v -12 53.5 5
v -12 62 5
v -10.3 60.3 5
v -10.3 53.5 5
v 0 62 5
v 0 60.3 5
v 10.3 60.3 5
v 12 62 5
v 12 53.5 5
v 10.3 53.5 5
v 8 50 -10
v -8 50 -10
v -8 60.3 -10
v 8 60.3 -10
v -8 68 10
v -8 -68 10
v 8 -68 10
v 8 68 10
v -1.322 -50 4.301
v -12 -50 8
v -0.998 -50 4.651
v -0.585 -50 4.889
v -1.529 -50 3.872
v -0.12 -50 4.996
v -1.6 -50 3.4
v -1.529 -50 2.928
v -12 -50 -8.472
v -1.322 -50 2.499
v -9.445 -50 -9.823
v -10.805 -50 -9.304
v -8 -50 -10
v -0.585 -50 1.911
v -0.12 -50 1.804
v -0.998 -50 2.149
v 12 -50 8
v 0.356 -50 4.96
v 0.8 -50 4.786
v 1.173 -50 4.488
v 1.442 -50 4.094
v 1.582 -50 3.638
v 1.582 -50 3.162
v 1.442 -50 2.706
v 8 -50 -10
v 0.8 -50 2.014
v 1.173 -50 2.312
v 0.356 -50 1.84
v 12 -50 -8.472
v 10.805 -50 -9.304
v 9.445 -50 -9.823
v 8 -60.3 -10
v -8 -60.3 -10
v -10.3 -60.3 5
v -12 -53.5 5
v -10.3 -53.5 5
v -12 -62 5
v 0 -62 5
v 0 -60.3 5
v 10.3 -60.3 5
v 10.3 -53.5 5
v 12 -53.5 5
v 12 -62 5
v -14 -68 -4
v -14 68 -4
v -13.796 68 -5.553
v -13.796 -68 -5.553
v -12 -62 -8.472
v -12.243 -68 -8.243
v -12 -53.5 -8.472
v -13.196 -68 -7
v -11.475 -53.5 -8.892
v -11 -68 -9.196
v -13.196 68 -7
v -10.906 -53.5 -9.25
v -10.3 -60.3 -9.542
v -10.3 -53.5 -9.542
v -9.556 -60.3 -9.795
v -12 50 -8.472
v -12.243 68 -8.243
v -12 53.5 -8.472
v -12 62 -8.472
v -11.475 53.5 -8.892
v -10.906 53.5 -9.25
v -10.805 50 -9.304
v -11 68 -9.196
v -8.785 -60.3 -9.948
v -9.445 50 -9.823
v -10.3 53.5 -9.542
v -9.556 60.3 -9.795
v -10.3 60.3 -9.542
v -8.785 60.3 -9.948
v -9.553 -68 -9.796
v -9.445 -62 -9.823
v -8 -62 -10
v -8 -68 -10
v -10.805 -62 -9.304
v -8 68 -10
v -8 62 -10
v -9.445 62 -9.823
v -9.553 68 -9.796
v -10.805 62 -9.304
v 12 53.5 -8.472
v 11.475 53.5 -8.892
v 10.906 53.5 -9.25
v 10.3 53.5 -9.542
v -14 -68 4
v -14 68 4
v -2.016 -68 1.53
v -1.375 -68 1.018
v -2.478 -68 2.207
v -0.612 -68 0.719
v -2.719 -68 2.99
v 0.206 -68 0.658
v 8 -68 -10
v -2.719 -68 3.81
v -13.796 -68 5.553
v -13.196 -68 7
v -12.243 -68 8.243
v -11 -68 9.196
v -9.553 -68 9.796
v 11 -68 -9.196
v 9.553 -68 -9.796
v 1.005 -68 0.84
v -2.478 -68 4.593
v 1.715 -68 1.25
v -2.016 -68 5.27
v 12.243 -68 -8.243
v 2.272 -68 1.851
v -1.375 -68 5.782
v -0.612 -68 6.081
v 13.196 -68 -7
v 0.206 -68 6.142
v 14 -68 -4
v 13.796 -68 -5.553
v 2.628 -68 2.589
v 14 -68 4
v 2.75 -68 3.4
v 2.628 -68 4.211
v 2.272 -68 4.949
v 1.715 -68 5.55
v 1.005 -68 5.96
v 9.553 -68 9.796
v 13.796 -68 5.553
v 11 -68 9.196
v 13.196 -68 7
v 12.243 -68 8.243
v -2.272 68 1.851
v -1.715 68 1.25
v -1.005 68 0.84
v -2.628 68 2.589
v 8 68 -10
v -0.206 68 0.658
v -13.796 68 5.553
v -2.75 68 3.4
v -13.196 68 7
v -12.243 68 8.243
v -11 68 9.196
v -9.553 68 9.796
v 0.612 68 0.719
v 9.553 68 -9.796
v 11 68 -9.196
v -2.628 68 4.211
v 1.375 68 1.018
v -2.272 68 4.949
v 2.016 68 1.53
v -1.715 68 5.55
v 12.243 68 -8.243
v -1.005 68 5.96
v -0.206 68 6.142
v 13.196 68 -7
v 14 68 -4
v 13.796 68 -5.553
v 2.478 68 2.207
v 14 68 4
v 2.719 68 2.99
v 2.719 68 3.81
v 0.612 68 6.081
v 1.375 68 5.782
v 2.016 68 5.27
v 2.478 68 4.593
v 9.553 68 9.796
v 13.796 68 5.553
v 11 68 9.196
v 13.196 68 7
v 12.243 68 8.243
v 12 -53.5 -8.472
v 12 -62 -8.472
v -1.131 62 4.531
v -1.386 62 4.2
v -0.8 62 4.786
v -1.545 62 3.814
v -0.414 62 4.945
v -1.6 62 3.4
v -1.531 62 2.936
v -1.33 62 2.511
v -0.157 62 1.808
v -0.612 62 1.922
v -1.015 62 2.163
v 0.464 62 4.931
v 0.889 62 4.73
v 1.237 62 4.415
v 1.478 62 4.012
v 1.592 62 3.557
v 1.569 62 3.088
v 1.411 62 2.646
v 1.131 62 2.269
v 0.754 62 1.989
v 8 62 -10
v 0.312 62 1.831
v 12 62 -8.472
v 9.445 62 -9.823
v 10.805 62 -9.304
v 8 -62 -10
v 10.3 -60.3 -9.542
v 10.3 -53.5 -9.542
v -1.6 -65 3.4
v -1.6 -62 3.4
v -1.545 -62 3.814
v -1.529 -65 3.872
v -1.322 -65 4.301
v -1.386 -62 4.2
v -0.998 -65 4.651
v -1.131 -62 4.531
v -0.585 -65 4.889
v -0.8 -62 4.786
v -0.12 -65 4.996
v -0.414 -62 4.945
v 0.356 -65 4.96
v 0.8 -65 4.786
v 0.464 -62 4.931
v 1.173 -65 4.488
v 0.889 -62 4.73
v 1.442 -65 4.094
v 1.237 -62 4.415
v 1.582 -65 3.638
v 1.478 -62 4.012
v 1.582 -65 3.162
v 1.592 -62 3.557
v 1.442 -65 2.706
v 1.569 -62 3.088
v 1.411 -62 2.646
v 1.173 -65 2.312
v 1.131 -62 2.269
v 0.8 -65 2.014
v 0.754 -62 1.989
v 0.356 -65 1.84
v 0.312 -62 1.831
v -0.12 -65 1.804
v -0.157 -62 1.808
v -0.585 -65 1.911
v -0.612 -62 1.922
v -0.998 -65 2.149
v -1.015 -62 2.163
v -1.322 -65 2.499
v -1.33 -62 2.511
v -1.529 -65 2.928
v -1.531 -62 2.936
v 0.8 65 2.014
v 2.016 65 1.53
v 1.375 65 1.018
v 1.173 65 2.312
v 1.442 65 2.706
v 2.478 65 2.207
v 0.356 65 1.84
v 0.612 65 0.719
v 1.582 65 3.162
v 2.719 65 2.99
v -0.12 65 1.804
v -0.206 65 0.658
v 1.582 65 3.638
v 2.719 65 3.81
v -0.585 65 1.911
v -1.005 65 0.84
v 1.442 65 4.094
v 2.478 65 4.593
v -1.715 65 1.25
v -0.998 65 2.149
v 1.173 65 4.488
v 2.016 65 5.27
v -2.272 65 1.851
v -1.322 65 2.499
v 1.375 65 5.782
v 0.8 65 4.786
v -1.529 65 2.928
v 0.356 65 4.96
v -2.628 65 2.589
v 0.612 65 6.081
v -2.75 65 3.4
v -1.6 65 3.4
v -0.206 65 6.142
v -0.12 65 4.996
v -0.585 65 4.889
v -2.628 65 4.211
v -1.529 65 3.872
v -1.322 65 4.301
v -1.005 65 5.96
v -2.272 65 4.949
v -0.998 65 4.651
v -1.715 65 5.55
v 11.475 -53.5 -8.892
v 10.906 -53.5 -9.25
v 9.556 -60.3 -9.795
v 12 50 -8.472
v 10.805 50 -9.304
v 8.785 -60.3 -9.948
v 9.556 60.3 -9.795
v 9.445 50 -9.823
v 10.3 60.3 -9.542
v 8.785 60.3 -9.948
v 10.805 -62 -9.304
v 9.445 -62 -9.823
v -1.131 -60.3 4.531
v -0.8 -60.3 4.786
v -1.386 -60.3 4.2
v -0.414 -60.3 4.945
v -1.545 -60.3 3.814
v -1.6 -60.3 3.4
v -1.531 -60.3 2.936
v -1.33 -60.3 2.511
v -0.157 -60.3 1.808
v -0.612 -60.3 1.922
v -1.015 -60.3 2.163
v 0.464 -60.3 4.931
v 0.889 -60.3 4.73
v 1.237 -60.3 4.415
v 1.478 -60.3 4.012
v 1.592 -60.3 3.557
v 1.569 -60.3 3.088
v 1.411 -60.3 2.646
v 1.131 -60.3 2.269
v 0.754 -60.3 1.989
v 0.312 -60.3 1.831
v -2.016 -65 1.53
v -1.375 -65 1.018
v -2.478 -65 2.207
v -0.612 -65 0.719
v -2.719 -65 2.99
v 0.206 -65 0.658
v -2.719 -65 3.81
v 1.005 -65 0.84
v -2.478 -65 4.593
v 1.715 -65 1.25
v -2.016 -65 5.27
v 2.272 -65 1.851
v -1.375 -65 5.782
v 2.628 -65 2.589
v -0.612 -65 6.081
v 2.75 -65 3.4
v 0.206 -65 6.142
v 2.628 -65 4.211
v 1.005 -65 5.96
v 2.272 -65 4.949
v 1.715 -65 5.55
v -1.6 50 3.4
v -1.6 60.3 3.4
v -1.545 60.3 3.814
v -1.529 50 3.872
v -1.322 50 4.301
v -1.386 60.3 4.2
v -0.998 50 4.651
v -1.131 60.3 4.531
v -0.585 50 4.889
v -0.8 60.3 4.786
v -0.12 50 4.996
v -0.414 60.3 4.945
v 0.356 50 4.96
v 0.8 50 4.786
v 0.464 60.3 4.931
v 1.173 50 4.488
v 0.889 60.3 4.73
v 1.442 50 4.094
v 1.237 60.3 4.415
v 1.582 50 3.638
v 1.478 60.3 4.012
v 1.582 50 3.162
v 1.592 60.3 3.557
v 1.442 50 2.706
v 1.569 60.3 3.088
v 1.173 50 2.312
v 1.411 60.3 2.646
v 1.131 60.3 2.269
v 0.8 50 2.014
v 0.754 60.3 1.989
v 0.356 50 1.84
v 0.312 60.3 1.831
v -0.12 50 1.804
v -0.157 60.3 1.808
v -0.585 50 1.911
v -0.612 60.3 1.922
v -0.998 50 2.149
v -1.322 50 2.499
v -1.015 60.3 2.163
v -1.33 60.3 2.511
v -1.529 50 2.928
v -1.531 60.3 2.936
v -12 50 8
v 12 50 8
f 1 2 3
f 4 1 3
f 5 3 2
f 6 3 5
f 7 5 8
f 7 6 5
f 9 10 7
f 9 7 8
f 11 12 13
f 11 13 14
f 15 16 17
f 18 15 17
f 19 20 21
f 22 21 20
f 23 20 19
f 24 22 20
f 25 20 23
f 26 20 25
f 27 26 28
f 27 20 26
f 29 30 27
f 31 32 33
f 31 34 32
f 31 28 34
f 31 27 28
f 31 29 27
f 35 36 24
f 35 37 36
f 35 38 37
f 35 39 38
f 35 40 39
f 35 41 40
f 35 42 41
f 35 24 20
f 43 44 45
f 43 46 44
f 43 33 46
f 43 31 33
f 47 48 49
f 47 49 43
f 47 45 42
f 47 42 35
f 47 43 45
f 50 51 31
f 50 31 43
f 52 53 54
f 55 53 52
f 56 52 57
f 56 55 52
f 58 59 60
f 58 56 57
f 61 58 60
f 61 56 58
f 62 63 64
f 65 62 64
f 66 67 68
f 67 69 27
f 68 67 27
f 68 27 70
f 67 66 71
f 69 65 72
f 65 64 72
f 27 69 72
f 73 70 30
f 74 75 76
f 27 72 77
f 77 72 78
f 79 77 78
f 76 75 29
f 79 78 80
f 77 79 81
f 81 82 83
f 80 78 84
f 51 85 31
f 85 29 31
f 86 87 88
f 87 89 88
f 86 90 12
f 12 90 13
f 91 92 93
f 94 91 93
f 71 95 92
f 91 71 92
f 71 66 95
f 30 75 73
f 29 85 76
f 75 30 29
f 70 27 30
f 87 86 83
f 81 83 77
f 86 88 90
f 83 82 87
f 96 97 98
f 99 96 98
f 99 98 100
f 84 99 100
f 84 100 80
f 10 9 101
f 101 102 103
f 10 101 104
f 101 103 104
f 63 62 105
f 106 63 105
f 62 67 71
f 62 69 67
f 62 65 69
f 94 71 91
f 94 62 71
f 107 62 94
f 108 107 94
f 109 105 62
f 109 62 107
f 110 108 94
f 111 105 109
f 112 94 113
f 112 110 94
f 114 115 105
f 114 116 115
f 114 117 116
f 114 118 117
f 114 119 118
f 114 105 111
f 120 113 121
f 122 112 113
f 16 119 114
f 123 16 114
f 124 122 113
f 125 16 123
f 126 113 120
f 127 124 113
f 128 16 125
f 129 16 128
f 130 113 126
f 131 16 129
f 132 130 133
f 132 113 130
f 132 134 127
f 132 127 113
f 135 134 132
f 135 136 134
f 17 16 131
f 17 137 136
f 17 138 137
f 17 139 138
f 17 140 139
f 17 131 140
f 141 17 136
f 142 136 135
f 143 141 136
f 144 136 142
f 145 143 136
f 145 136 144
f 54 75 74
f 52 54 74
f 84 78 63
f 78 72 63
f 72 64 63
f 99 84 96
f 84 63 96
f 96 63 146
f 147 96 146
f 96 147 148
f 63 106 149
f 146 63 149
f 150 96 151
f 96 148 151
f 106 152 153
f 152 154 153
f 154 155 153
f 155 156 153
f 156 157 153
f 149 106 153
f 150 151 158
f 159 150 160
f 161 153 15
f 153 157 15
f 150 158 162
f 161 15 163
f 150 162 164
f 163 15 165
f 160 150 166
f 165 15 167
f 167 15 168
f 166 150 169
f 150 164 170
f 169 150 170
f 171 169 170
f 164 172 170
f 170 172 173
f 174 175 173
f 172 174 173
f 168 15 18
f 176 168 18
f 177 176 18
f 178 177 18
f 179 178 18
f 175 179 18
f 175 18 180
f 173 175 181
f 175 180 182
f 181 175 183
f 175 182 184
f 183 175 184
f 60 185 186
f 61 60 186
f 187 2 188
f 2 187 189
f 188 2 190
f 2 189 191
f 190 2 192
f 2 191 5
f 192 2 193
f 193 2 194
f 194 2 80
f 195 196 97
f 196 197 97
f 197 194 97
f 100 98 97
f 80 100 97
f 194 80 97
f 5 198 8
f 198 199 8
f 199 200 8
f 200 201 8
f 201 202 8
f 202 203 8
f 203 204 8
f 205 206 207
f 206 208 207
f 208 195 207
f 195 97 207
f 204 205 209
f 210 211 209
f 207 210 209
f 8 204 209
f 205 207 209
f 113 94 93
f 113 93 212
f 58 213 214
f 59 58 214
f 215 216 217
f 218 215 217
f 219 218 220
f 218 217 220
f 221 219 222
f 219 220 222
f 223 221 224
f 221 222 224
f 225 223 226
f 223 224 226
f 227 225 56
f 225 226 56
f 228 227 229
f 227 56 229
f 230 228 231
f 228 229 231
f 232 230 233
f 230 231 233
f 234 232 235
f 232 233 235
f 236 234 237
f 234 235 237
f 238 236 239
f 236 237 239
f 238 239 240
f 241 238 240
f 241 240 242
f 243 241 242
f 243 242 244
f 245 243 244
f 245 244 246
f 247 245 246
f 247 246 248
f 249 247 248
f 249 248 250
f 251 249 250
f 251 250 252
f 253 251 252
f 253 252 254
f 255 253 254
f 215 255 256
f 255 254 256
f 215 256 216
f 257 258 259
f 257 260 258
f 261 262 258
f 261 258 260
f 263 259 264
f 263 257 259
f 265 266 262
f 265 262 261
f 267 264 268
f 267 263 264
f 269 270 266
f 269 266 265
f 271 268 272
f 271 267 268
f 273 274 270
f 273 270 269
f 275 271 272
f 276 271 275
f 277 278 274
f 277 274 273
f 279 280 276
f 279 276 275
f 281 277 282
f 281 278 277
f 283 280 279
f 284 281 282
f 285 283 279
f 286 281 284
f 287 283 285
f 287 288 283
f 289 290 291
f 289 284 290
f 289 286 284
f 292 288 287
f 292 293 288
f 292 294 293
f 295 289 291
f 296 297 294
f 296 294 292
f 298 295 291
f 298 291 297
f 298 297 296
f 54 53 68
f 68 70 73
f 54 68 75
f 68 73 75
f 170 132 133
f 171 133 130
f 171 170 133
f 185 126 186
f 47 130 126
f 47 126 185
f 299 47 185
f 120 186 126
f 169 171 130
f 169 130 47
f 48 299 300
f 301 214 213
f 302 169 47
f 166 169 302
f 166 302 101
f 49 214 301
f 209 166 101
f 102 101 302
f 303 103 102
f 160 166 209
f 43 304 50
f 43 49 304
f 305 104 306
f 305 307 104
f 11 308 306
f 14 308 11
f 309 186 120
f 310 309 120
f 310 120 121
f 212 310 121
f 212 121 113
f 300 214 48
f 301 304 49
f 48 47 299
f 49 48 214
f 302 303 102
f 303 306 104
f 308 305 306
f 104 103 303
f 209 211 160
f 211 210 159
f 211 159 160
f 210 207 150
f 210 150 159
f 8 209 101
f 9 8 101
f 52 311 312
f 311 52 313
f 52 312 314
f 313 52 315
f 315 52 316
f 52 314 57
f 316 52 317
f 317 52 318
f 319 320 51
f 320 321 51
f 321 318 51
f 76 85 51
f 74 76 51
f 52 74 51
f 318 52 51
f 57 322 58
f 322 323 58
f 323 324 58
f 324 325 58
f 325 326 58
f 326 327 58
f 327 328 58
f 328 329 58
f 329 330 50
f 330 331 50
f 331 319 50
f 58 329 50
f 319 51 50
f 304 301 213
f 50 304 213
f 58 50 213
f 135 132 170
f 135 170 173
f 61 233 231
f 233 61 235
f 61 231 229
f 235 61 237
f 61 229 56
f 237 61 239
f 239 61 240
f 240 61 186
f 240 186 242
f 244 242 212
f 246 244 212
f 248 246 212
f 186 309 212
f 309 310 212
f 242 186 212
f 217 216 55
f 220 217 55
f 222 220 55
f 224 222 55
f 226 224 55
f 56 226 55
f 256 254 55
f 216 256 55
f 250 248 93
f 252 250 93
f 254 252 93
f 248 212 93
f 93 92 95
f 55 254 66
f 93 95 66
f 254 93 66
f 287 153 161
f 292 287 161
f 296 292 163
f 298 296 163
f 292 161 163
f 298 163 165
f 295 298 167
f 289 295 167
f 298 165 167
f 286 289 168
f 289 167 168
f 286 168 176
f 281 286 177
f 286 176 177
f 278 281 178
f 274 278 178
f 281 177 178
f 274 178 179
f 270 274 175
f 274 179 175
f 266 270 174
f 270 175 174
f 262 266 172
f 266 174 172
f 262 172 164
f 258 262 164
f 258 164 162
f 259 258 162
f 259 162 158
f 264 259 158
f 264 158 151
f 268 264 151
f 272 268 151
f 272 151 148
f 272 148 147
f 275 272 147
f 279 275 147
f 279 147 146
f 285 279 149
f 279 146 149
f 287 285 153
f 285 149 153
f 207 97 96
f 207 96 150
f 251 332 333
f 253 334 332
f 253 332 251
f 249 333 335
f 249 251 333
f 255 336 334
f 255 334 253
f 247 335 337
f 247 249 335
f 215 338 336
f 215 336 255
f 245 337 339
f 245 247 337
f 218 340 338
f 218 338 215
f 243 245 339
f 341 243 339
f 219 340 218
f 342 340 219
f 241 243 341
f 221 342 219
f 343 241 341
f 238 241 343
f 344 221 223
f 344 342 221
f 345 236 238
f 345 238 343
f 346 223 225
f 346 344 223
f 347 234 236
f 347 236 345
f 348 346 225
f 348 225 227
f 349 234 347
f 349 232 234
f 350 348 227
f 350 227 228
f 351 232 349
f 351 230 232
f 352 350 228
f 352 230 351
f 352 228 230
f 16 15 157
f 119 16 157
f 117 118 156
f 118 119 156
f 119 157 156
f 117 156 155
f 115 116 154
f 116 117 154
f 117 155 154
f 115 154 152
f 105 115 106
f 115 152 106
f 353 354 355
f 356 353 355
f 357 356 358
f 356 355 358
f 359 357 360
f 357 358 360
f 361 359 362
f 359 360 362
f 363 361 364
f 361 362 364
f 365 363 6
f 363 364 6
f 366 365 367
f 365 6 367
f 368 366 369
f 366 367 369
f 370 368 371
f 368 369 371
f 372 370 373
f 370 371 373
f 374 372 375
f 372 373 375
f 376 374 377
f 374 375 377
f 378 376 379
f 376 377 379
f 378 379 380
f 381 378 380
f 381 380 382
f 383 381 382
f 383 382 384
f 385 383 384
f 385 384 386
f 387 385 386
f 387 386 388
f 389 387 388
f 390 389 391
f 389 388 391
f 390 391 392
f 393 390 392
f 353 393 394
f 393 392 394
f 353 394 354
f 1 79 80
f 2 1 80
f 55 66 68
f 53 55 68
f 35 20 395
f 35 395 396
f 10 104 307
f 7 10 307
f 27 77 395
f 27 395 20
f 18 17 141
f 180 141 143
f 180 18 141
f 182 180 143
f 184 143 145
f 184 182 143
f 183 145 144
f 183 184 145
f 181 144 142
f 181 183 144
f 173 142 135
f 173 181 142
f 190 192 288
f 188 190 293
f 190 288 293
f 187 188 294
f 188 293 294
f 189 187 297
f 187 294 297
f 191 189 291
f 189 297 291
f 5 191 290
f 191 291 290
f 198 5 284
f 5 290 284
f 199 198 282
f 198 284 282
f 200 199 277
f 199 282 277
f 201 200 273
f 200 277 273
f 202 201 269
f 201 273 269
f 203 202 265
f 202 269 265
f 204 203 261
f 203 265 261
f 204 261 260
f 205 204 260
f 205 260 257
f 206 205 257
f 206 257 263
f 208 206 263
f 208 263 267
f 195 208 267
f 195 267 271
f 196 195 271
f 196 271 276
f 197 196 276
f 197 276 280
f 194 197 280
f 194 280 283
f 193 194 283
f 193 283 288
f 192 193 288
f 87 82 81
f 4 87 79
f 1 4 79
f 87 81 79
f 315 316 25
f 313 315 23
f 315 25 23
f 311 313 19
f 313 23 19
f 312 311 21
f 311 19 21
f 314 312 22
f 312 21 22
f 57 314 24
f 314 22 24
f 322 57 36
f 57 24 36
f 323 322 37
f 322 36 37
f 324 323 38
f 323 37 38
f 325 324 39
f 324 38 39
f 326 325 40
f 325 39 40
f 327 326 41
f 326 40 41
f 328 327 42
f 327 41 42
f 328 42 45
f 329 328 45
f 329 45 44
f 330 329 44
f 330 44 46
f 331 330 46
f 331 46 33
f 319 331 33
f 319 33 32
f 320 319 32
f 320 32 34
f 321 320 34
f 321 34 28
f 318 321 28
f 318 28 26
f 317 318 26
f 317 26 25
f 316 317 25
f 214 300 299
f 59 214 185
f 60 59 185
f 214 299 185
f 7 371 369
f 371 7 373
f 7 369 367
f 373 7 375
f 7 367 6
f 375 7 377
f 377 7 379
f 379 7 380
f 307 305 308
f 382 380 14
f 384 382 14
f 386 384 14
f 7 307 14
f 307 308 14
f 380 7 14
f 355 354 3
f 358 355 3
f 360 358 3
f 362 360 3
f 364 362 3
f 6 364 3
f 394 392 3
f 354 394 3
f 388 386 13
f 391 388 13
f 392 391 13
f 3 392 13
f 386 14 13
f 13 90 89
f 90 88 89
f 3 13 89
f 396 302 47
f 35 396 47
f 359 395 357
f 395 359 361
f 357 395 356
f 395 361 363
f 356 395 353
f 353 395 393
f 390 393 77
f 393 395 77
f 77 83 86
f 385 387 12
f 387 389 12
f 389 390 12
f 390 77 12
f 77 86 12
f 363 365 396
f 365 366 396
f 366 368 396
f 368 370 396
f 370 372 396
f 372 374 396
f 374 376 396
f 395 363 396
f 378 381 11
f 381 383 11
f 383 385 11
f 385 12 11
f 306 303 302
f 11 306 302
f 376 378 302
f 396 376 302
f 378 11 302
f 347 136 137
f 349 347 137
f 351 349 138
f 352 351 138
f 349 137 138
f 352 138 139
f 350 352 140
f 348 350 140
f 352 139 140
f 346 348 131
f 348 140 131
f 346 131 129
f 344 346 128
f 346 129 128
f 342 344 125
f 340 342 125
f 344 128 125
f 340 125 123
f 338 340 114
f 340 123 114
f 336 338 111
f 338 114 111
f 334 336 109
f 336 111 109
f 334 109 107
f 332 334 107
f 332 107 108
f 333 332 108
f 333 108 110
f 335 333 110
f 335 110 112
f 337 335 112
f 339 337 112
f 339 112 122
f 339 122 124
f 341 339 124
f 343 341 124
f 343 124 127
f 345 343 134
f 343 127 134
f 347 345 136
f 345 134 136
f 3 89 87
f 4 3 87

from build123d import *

# Parameters (mm, degrees)
F0_W        = 28
F0_H        = 20
F1_DEPTH    = 68
F3_DEPTH    = 15
F2_W        = 24
F2_H        = 100
F4_DEPTH    = 18
F5_T1_DEPTH = 166
F6_R        = 1.6
F7_DEPTH    = 140
F6_R_2      = 2.75
F8_DEPTH    = 3
F9_R        = 2.75
F9_R_2      = 1.6
F10_DEPTH   = 3


# Not quite as in the source:
# - a fillet or chamfer that OpenCascade refuses, or shapes differently, is made with other operations: its cross-section is extruded or revolved along the edge and cut away or added


with BuildPart() as f1:
    # F0 (on Front) → F1 (new body, symmetric)
    with BuildSketch(Plane.XZ):
        Rectangle(F0_W, F0_H)
    extrude(amount=F1_DEPTH, both=True)

    # F2 (on face) → F3 (cut)
    with BuildSketch(Plane(origin=(0, 0, -10), x_dir=(1, 0, 0), z_dir=(0, 0, -1))):
        Polygon((12, 62), (-12, 62), (-12, 53.5), (-10.3, 53.5), (-10.3, 60.3), (10.3, 60.3), (10.3, 53.5), (12, 53.5), align=None)
        Polygon((-12, -53.5), (-12, -62), (12, -62), (12, -53.5), (10.3, -53.5), (10.3, -60.3), (-10.3, -60.3), (-10.3, -53.5), align=None)
    extrude(amount=-F3_DEPTH, mode=Mode.SUBTRACT)

    # F2 (on face) → F4 (cut)
    with BuildSketch(Plane(origin=(0, 0, -10), x_dir=(1, 0, 0), z_dir=(0, 0, -1))):
        Rectangle(F2_W, F2_H)
    extrude(amount=-F4_DEPTH, mode=Mode.SUBTRACT)

    # F5: fillet of radius 6 on 4 edges, made by hand

    # F5_s2 → F5_t1 (cut)
    with BuildSketch(Plane.XZ.offset(-83)):
        with BuildLine():
            ThreePointArc((-8, 10), (-12.2426406871, 8.2426406871), (-14, 4))
            Line((-14, 4), (-14, 10))
            Line((-14, 10), (-8, 10))
        make_face()
        with BuildLine():
            ThreePointArc((8, 10), (12.2426406871, 8.2426406871), (14, 4))
            Line((14, 4), (14, 10))
            Line((14, 10), (8, 10))
        make_face()
        with BuildLine():
            ThreePointArc((14, -4), (12.2426406871, -8.2426406871), (8, -10))
            Line((8, -10), (14, -10))
            Line((14, -10), (14, -4))
        make_face()
        with BuildLine():
            ThreePointArc((-14, -4), (-12.2426406871, -8.2426406871), (-8, -10))
            Line((-8, -10), (-14, -10))
            Line((-14, -10), (-14, -4))
        make_face()
    extrude(amount=F5_T1_DEPTH, mode=Mode.SUBTRACT)

    # F6 (on face) → F7 (cut)
    with BuildSketch(Plane(origin=(0, 68, 0), x_dir=(-1, 0, 0), z_dir=(0, 1, 0))):
        with Locations((0, 3.4)):
            Circle(F6_R)
    extrude(amount=-F7_DEPTH, mode=Mode.SUBTRACT)

    # F6 (on face) → F8 (cut)
    with BuildSketch(Plane(origin=(0, 68, 0), x_dir=(-1, 0, 0), z_dir=(0, 1, 0))):
        with Locations((0, 3.4)):
            Circle(F6_R_2)
        with Locations((0, 3.4)):
            Circle(F6_R, mode=Mode.SUBTRACT)
    extrude(amount=-F8_DEPTH, mode=Mode.SUBTRACT)

    # F9 (on face) → F10 (cut)
    with BuildSketch(Plane.XZ.offset(68)):
        with Locations((0, 3.4)):
            Circle(F9_R)
        with Locations((0, 3.4)):
            Circle(F9_R_2, mode=Mode.SUBTRACT)
    extrude(amount=-F10_DEPTH, mode=Mode.SUBTRACT)


solid = f1.part
